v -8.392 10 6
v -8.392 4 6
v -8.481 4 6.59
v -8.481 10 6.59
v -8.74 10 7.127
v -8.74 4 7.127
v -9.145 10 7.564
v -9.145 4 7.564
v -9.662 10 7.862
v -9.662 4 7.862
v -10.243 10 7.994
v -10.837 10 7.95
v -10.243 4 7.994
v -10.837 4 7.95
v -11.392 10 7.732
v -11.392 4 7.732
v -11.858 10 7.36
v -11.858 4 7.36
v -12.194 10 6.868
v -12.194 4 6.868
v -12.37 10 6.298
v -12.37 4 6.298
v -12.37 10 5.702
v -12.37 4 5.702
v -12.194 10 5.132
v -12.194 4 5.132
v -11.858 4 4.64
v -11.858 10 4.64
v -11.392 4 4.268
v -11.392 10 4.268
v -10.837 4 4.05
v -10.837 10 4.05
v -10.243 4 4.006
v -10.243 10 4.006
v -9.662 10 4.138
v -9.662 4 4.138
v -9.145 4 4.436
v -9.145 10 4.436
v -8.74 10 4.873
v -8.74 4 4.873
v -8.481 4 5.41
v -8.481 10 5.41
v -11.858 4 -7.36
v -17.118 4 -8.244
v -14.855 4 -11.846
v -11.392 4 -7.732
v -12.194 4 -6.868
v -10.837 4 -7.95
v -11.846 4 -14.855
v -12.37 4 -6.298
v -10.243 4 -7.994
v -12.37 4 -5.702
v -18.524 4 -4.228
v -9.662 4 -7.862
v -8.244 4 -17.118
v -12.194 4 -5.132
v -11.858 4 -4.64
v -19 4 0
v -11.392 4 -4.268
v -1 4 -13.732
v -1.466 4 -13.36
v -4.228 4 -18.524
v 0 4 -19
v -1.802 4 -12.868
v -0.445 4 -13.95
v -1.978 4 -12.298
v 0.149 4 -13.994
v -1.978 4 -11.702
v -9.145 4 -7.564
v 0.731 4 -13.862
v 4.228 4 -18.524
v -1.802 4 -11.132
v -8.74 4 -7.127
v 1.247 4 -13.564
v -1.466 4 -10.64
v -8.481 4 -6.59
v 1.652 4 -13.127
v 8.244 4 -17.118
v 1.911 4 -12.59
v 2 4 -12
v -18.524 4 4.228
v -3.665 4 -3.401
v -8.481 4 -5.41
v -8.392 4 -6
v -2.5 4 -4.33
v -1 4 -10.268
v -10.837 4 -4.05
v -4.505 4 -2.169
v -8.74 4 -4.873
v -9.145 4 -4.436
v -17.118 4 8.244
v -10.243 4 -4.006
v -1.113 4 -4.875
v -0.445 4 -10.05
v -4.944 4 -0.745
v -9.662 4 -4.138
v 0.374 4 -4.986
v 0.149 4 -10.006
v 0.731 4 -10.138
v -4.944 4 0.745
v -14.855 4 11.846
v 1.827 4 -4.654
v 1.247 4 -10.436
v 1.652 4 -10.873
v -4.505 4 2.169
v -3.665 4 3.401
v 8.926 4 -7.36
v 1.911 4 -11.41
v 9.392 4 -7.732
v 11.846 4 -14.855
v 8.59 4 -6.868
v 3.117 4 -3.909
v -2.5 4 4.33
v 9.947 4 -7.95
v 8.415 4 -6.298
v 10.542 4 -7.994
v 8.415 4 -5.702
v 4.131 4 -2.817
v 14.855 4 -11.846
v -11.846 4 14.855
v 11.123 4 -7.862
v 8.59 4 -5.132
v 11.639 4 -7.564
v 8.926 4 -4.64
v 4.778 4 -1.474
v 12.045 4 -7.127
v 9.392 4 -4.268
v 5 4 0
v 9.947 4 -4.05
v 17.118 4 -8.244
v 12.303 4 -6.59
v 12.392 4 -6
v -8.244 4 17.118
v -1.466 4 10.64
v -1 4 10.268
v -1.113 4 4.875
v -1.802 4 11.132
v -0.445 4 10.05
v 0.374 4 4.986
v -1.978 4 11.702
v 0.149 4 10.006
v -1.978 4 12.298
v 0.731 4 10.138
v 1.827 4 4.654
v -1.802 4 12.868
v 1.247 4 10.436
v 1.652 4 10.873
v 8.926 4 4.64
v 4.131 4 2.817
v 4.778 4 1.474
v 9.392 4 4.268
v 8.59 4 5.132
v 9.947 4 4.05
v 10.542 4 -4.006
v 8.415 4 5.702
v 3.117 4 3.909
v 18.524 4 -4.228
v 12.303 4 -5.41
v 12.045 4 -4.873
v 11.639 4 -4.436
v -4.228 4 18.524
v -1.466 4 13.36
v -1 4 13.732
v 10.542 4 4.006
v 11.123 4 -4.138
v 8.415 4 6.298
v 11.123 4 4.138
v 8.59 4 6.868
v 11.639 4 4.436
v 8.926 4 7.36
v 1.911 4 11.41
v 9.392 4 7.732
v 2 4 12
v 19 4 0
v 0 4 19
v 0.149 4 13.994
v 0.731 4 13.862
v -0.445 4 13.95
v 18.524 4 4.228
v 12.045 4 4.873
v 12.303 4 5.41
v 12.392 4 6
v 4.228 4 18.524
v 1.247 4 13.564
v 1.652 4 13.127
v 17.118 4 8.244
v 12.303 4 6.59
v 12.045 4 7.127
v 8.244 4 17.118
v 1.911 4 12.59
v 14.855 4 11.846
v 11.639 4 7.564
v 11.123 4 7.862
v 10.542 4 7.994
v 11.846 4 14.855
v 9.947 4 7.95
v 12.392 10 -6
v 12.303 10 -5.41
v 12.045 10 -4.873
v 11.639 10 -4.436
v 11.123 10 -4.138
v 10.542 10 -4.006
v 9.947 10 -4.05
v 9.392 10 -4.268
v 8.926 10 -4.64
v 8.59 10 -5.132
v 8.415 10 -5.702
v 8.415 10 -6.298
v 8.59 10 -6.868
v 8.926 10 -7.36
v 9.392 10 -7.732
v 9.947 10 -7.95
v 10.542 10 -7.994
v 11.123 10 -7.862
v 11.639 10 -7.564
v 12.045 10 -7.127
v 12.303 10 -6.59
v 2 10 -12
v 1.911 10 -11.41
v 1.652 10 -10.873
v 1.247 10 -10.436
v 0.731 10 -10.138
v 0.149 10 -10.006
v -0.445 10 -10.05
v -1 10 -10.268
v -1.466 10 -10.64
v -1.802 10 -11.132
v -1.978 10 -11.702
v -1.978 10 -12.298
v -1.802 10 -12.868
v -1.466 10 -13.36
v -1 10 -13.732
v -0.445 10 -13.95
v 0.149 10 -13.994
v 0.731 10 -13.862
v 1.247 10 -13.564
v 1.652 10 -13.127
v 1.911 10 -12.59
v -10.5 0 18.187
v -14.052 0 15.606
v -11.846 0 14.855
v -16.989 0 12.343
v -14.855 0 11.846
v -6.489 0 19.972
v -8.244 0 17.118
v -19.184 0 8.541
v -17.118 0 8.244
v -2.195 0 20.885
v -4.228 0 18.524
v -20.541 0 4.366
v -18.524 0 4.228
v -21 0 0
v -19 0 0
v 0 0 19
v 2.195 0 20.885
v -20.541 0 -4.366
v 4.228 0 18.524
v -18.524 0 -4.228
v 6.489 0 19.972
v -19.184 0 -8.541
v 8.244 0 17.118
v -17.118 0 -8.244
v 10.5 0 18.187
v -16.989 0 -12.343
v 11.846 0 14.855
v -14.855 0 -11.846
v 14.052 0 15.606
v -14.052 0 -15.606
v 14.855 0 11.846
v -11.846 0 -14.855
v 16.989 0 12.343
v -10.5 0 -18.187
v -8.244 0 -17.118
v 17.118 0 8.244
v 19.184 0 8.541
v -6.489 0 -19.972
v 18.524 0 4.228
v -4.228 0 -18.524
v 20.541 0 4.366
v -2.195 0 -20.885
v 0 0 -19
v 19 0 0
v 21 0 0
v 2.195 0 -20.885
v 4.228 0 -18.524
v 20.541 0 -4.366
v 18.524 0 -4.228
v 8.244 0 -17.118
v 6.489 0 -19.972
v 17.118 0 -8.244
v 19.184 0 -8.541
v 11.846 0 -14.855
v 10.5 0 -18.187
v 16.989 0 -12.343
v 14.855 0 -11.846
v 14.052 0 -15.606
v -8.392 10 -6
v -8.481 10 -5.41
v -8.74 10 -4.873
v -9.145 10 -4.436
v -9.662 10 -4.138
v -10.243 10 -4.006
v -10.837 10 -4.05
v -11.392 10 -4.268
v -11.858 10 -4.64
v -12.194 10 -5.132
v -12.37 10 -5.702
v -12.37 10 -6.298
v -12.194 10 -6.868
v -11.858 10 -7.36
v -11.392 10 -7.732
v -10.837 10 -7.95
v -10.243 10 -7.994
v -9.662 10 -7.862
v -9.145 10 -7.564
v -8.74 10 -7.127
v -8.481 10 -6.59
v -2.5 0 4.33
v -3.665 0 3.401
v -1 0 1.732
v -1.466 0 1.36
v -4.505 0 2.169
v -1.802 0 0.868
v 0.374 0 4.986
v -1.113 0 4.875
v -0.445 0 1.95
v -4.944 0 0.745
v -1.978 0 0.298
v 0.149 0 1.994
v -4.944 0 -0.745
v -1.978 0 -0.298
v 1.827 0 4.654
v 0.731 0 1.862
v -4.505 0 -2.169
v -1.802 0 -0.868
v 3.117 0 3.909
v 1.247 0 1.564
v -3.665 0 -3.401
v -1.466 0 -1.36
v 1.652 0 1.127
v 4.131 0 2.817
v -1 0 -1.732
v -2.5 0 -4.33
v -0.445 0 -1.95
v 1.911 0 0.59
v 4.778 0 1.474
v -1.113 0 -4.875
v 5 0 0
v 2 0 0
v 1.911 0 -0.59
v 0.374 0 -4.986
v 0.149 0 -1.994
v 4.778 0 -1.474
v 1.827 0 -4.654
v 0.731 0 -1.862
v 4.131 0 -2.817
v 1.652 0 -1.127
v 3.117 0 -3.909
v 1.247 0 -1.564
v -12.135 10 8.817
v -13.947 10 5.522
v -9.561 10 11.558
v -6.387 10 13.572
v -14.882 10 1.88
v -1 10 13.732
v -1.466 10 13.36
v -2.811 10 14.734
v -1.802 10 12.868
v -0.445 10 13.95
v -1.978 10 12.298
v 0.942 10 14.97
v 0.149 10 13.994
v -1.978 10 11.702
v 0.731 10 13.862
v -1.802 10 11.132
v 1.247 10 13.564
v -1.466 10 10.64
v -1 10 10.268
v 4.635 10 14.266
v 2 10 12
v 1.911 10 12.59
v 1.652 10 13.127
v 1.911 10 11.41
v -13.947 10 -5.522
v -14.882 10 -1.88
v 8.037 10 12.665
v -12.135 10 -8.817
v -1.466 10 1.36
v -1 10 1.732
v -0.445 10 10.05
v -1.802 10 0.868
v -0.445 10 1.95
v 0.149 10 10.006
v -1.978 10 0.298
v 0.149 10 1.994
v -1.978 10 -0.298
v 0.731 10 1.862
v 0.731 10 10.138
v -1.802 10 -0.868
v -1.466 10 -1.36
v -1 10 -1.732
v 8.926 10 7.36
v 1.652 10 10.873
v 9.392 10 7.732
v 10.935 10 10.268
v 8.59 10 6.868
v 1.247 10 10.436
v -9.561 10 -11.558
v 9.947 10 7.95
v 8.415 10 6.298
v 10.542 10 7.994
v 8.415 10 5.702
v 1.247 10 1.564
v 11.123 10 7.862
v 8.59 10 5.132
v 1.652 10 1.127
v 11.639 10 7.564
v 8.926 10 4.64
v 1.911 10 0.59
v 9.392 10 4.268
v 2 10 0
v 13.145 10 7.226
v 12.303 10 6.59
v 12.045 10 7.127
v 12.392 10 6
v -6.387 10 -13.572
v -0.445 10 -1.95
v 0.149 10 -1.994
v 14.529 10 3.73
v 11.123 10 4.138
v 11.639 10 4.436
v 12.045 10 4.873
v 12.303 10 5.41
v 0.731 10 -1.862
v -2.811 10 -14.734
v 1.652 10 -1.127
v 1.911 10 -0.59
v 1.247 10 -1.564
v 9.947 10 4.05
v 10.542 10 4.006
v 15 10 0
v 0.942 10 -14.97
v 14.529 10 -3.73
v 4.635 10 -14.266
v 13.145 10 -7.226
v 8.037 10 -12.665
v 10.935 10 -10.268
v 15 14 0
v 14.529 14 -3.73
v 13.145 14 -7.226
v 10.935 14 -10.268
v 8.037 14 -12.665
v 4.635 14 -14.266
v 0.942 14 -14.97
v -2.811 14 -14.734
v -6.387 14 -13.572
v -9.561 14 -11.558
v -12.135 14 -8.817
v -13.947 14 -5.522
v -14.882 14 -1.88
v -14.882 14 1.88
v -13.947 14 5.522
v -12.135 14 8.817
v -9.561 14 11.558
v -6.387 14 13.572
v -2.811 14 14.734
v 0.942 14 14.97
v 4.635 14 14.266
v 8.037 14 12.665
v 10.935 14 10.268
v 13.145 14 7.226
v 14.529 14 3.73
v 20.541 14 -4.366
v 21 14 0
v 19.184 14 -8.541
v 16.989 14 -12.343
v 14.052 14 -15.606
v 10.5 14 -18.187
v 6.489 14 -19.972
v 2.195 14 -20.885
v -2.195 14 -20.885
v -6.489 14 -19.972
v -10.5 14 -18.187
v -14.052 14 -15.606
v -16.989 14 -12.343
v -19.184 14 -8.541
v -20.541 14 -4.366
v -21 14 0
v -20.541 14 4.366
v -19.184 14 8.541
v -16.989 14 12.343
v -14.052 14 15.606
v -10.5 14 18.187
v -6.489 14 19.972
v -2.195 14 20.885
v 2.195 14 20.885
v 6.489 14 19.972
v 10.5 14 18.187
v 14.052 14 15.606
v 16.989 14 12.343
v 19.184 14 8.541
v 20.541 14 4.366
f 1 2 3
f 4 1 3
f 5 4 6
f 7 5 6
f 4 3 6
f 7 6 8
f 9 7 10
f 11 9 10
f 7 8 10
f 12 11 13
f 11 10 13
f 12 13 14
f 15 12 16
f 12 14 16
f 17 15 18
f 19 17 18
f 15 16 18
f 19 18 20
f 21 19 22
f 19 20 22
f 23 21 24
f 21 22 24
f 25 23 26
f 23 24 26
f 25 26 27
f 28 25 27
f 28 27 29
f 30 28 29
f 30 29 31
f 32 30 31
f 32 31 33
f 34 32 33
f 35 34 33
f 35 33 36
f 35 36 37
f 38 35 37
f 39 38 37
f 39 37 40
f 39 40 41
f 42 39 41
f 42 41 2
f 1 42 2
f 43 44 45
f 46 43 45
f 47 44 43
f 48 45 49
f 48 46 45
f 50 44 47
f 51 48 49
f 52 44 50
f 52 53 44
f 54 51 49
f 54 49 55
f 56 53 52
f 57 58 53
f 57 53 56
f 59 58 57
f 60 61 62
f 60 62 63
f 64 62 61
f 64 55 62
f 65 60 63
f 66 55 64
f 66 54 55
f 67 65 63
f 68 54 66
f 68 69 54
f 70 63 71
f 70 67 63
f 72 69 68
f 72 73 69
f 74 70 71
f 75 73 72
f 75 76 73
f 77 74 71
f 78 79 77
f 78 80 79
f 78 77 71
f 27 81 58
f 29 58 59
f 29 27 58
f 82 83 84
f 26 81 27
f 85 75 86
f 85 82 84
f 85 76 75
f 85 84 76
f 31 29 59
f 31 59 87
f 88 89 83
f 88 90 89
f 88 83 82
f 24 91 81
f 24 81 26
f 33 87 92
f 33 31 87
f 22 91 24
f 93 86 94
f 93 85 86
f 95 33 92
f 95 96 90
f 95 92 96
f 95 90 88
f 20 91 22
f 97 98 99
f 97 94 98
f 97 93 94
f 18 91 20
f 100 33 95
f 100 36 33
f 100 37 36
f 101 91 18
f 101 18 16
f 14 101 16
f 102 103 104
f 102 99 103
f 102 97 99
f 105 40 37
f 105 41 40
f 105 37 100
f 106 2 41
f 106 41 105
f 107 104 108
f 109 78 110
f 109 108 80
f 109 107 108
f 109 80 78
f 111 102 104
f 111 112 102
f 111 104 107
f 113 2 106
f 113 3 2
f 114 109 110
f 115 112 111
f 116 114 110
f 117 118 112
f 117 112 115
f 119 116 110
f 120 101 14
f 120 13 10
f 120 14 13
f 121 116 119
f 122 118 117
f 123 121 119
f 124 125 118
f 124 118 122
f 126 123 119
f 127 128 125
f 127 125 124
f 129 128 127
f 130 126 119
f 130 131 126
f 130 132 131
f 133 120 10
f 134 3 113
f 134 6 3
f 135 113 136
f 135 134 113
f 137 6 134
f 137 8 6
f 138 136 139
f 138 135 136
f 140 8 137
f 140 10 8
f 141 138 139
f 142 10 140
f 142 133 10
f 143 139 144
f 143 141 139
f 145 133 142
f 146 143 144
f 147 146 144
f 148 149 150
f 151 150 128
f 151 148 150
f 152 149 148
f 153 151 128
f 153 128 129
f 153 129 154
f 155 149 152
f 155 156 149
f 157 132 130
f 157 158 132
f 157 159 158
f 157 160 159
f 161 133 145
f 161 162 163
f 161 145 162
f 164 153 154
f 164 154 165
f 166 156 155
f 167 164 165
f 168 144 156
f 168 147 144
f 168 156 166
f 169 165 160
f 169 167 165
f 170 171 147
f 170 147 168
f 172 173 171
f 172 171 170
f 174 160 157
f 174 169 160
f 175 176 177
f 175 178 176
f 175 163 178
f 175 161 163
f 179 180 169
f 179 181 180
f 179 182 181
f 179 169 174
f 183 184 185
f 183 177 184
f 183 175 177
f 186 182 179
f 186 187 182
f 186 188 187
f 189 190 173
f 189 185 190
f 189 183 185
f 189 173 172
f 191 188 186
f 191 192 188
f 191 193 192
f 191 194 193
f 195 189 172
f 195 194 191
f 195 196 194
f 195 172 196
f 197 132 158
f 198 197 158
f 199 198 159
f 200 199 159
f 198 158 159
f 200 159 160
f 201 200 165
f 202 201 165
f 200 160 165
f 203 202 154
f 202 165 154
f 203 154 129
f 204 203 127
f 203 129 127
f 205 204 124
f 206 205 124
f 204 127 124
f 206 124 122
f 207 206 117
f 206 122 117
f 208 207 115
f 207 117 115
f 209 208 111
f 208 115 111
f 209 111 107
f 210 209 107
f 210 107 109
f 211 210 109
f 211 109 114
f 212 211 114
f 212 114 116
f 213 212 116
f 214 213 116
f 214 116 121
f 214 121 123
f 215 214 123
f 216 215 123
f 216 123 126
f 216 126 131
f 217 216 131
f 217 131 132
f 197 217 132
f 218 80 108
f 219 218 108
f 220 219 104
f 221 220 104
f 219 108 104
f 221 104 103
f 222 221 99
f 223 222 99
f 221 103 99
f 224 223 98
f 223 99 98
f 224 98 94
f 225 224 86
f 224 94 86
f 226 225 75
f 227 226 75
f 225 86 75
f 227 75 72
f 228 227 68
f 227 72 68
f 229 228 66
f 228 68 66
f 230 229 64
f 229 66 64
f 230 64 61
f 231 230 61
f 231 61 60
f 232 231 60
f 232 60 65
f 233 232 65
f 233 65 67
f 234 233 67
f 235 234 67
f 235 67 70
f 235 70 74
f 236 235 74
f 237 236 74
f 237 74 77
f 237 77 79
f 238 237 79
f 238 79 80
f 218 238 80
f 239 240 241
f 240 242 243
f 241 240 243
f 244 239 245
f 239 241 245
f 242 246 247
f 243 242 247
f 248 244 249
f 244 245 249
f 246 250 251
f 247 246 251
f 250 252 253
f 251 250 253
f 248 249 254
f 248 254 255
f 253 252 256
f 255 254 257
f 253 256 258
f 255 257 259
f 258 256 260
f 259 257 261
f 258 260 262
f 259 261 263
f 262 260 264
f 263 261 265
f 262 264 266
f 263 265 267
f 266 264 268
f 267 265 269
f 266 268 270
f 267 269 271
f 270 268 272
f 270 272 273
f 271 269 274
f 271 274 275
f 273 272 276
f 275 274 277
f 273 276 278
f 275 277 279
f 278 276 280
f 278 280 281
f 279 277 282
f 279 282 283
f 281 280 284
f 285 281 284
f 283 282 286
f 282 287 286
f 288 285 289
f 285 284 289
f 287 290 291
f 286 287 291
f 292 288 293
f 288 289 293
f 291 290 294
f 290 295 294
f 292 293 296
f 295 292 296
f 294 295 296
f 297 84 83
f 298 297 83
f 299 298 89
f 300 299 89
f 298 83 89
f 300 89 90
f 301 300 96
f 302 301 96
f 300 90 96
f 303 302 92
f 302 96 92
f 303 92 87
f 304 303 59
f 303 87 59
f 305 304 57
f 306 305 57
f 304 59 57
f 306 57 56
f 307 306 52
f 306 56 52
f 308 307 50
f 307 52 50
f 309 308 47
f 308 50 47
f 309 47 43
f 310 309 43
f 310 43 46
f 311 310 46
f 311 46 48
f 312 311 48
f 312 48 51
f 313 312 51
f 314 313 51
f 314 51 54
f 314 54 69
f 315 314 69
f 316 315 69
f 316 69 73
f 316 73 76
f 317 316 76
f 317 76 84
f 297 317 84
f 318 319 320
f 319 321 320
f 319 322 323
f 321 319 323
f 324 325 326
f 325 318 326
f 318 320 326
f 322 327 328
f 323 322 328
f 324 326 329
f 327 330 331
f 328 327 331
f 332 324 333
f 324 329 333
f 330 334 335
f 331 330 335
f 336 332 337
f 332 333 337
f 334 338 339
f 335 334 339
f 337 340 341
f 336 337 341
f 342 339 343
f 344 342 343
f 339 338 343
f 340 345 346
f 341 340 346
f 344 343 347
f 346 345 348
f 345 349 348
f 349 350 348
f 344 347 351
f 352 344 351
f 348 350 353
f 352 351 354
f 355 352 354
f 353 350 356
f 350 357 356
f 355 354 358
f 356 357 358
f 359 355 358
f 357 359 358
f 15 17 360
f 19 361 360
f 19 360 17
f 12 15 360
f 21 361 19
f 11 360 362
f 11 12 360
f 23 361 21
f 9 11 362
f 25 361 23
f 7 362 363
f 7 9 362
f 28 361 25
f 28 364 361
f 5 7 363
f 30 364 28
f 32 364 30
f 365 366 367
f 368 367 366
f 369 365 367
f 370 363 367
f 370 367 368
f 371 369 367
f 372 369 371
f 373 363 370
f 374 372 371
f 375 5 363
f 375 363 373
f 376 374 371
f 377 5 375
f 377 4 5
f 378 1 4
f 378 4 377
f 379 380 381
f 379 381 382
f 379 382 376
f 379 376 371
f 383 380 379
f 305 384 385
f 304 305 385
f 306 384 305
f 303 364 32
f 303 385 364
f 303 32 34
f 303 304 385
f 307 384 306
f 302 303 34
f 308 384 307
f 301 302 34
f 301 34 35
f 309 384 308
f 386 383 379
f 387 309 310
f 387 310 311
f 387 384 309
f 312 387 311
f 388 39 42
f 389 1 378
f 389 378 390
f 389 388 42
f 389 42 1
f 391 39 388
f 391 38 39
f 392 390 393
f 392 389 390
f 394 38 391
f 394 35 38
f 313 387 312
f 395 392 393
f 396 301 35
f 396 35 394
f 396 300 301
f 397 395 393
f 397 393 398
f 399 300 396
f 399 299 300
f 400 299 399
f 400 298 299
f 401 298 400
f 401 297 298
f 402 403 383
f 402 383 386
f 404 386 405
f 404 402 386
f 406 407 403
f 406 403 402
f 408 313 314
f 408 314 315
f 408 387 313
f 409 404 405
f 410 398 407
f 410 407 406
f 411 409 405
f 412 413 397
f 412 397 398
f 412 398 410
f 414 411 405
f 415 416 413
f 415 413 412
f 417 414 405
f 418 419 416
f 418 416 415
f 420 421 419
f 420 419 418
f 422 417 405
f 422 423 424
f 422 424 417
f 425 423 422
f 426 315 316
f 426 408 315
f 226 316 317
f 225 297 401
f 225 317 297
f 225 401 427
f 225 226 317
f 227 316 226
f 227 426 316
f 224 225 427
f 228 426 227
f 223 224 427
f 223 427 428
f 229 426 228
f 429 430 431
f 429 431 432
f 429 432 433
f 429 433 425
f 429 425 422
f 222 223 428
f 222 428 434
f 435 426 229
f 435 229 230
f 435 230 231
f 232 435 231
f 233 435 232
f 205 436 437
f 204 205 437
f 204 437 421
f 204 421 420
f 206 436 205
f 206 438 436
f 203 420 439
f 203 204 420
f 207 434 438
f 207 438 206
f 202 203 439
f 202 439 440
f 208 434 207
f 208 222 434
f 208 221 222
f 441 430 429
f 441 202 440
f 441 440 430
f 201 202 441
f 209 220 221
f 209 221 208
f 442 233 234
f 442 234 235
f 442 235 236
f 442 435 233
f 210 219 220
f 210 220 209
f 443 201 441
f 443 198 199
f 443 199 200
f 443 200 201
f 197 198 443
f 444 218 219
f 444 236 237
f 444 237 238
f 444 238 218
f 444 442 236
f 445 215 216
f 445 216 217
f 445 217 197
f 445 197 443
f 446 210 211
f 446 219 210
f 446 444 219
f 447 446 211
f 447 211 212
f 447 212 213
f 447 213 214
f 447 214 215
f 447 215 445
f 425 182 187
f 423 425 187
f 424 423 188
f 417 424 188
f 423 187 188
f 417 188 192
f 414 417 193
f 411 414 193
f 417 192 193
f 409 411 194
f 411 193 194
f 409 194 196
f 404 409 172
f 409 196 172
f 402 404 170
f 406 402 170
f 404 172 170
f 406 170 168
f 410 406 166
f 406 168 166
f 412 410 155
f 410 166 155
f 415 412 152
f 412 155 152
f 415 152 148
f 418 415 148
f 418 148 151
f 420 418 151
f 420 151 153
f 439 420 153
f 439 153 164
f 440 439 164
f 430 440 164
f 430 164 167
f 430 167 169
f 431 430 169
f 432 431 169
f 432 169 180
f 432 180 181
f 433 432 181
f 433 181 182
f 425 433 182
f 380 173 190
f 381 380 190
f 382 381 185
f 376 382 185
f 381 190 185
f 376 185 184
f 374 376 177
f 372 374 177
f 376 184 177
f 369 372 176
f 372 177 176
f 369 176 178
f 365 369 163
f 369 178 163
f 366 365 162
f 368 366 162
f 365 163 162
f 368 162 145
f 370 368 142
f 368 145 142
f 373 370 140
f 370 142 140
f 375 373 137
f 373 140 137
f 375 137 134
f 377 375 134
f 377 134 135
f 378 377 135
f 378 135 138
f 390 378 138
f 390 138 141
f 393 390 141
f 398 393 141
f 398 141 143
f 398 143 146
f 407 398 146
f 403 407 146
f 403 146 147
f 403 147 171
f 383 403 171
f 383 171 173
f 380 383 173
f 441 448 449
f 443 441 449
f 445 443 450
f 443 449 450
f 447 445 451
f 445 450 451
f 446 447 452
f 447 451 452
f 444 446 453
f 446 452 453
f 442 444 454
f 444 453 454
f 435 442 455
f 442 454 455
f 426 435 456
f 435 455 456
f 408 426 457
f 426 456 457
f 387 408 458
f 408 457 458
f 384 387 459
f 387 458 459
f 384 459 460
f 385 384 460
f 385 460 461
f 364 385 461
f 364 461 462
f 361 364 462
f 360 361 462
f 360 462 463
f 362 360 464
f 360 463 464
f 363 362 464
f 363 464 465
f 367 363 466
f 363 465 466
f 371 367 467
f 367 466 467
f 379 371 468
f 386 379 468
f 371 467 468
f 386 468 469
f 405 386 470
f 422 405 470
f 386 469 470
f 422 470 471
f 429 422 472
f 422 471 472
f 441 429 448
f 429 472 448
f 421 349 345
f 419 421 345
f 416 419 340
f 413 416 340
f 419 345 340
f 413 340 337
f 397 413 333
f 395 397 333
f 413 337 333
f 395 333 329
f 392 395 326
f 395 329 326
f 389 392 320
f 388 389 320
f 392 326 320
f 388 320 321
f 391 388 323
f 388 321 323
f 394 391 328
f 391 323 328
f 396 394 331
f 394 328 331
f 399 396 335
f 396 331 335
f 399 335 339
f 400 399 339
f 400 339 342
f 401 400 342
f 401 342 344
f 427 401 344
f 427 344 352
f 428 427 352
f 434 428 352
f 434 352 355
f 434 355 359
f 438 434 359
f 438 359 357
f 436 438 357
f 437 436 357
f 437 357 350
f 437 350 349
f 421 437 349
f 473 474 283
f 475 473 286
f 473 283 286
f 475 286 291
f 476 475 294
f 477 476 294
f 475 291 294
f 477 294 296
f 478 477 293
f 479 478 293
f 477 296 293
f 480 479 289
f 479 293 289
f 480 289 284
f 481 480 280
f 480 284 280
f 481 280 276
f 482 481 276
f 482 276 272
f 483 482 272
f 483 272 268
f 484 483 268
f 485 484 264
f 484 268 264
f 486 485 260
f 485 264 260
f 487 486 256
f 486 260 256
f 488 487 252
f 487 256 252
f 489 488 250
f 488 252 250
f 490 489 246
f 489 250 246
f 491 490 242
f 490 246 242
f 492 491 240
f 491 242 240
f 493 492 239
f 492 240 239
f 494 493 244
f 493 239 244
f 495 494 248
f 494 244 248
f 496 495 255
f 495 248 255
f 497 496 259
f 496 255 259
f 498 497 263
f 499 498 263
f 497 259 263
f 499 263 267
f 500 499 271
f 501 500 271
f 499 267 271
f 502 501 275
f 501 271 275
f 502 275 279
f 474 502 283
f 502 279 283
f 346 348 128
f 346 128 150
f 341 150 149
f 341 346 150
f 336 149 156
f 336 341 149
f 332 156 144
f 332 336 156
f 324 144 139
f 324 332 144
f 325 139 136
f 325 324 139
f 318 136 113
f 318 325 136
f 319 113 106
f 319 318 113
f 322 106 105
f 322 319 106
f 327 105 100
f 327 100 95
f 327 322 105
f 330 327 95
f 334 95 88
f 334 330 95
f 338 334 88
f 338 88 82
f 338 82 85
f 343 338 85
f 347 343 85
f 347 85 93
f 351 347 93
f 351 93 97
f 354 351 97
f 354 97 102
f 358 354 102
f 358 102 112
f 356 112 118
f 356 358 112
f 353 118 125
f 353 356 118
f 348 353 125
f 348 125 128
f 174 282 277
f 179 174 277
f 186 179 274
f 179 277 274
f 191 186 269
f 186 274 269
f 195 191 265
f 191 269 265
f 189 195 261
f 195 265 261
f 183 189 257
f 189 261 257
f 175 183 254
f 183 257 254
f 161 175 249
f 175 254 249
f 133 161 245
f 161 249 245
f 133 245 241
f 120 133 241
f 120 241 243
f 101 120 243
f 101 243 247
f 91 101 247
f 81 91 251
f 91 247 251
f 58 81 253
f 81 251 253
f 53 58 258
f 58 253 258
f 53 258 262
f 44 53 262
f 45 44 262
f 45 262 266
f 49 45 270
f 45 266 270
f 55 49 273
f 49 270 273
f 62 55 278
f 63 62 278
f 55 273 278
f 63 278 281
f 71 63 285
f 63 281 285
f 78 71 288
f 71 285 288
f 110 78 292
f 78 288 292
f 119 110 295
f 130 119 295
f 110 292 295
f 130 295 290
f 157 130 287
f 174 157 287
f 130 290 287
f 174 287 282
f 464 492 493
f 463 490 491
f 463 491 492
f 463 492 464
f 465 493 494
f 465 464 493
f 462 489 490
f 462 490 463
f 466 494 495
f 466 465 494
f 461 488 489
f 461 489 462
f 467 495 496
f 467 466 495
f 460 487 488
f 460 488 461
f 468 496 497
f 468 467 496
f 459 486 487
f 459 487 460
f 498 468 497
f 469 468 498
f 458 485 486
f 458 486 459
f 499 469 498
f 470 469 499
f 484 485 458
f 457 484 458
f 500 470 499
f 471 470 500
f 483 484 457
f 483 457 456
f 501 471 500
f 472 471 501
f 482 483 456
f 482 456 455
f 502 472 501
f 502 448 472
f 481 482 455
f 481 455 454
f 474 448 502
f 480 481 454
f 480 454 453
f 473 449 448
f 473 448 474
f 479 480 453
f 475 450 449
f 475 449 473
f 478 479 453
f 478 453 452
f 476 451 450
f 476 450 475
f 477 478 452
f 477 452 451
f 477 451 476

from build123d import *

# Parameters (mm, degrees)
SKETCH1_R           = 21
BOSS_EXTRUDE1_DEPTH = 14
SKETCH2_R           = 15
CUT_EXTRUDE1_DEPTH  = 4
SKETCH3_R           = 19
SKETCH3_R_2         = 5
CUT_EXTRUDE2_DEPTH  = 4
SKETCH4_R           = 2
CUT_EXTRUDE3_DEPTH  = 15
SKETCH5_R           = 2
CUT_EXTRUDE4_DEPTH  = 11


with BuildPart() as part:
    # Sketch1 → Boss-Extrude1 (new body)
    with BuildSketch(Plane(origin=(0, 0, 0), x_dir=(1, 0, 0), z_dir=(0, 1, 0))):
        Circle(SKETCH1_R)
    extrude(amount=BOSS_EXTRUDE1_DEPTH)

    # Sketch2 → Cut-Extrude1 (cut)
    with BuildSketch(Plane(origin=(0, 14, 0), x_dir=(1, 0, 0), z_dir=(0, 1, 0))):
        Circle(SKETCH2_R)
    extrude(amount=-CUT_EXTRUDE1_DEPTH, mode=Mode.SUBTRACT)

    # Sketch3 → Cut-Extrude2 (cut)
    with BuildSketch(Plane.XZ):
        Circle(SKETCH3_R)
        Circle(SKETCH3_R_2, mode=Mode.SUBTRACT)
    extrude(amount=-CUT_EXTRUDE2_DEPTH, mode=Mode.SUBTRACT)

    # Sketch4 → Cut-Extrude3 (cut, through all)
    with BuildSketch(Plane.XZ):
        Circle(SKETCH4_R)
    extrude(amount=-CUT_EXTRUDE3_DEPTH, mode=Mode.SUBTRACT)

    # Sketch5 → Cut-Extrude4 (cut, through all)
    with BuildSketch(Plane.XZ.offset(-4)):
        with Locations((0, 12)):
            Circle(SKETCH5_R)
        with Locations((10.392304845, 6)):
            Circle(SKETCH5_R)
        with Locations((10.392304845, -6)):
            Circle(SKETCH5_R)
        with Locations((0, -12)):
            Circle(SKETCH5_R)
        with Locations((-10.392304845, -6)):
            Circle(SKETCH5_R)
        with Locations((-10.392304845, 6)):
            Circle(SKETCH5_R)
    extrude(amount=-CUT_EXTRUDE4_DEPTH, mode=Mode.SUBTRACT)


solid = part.part
